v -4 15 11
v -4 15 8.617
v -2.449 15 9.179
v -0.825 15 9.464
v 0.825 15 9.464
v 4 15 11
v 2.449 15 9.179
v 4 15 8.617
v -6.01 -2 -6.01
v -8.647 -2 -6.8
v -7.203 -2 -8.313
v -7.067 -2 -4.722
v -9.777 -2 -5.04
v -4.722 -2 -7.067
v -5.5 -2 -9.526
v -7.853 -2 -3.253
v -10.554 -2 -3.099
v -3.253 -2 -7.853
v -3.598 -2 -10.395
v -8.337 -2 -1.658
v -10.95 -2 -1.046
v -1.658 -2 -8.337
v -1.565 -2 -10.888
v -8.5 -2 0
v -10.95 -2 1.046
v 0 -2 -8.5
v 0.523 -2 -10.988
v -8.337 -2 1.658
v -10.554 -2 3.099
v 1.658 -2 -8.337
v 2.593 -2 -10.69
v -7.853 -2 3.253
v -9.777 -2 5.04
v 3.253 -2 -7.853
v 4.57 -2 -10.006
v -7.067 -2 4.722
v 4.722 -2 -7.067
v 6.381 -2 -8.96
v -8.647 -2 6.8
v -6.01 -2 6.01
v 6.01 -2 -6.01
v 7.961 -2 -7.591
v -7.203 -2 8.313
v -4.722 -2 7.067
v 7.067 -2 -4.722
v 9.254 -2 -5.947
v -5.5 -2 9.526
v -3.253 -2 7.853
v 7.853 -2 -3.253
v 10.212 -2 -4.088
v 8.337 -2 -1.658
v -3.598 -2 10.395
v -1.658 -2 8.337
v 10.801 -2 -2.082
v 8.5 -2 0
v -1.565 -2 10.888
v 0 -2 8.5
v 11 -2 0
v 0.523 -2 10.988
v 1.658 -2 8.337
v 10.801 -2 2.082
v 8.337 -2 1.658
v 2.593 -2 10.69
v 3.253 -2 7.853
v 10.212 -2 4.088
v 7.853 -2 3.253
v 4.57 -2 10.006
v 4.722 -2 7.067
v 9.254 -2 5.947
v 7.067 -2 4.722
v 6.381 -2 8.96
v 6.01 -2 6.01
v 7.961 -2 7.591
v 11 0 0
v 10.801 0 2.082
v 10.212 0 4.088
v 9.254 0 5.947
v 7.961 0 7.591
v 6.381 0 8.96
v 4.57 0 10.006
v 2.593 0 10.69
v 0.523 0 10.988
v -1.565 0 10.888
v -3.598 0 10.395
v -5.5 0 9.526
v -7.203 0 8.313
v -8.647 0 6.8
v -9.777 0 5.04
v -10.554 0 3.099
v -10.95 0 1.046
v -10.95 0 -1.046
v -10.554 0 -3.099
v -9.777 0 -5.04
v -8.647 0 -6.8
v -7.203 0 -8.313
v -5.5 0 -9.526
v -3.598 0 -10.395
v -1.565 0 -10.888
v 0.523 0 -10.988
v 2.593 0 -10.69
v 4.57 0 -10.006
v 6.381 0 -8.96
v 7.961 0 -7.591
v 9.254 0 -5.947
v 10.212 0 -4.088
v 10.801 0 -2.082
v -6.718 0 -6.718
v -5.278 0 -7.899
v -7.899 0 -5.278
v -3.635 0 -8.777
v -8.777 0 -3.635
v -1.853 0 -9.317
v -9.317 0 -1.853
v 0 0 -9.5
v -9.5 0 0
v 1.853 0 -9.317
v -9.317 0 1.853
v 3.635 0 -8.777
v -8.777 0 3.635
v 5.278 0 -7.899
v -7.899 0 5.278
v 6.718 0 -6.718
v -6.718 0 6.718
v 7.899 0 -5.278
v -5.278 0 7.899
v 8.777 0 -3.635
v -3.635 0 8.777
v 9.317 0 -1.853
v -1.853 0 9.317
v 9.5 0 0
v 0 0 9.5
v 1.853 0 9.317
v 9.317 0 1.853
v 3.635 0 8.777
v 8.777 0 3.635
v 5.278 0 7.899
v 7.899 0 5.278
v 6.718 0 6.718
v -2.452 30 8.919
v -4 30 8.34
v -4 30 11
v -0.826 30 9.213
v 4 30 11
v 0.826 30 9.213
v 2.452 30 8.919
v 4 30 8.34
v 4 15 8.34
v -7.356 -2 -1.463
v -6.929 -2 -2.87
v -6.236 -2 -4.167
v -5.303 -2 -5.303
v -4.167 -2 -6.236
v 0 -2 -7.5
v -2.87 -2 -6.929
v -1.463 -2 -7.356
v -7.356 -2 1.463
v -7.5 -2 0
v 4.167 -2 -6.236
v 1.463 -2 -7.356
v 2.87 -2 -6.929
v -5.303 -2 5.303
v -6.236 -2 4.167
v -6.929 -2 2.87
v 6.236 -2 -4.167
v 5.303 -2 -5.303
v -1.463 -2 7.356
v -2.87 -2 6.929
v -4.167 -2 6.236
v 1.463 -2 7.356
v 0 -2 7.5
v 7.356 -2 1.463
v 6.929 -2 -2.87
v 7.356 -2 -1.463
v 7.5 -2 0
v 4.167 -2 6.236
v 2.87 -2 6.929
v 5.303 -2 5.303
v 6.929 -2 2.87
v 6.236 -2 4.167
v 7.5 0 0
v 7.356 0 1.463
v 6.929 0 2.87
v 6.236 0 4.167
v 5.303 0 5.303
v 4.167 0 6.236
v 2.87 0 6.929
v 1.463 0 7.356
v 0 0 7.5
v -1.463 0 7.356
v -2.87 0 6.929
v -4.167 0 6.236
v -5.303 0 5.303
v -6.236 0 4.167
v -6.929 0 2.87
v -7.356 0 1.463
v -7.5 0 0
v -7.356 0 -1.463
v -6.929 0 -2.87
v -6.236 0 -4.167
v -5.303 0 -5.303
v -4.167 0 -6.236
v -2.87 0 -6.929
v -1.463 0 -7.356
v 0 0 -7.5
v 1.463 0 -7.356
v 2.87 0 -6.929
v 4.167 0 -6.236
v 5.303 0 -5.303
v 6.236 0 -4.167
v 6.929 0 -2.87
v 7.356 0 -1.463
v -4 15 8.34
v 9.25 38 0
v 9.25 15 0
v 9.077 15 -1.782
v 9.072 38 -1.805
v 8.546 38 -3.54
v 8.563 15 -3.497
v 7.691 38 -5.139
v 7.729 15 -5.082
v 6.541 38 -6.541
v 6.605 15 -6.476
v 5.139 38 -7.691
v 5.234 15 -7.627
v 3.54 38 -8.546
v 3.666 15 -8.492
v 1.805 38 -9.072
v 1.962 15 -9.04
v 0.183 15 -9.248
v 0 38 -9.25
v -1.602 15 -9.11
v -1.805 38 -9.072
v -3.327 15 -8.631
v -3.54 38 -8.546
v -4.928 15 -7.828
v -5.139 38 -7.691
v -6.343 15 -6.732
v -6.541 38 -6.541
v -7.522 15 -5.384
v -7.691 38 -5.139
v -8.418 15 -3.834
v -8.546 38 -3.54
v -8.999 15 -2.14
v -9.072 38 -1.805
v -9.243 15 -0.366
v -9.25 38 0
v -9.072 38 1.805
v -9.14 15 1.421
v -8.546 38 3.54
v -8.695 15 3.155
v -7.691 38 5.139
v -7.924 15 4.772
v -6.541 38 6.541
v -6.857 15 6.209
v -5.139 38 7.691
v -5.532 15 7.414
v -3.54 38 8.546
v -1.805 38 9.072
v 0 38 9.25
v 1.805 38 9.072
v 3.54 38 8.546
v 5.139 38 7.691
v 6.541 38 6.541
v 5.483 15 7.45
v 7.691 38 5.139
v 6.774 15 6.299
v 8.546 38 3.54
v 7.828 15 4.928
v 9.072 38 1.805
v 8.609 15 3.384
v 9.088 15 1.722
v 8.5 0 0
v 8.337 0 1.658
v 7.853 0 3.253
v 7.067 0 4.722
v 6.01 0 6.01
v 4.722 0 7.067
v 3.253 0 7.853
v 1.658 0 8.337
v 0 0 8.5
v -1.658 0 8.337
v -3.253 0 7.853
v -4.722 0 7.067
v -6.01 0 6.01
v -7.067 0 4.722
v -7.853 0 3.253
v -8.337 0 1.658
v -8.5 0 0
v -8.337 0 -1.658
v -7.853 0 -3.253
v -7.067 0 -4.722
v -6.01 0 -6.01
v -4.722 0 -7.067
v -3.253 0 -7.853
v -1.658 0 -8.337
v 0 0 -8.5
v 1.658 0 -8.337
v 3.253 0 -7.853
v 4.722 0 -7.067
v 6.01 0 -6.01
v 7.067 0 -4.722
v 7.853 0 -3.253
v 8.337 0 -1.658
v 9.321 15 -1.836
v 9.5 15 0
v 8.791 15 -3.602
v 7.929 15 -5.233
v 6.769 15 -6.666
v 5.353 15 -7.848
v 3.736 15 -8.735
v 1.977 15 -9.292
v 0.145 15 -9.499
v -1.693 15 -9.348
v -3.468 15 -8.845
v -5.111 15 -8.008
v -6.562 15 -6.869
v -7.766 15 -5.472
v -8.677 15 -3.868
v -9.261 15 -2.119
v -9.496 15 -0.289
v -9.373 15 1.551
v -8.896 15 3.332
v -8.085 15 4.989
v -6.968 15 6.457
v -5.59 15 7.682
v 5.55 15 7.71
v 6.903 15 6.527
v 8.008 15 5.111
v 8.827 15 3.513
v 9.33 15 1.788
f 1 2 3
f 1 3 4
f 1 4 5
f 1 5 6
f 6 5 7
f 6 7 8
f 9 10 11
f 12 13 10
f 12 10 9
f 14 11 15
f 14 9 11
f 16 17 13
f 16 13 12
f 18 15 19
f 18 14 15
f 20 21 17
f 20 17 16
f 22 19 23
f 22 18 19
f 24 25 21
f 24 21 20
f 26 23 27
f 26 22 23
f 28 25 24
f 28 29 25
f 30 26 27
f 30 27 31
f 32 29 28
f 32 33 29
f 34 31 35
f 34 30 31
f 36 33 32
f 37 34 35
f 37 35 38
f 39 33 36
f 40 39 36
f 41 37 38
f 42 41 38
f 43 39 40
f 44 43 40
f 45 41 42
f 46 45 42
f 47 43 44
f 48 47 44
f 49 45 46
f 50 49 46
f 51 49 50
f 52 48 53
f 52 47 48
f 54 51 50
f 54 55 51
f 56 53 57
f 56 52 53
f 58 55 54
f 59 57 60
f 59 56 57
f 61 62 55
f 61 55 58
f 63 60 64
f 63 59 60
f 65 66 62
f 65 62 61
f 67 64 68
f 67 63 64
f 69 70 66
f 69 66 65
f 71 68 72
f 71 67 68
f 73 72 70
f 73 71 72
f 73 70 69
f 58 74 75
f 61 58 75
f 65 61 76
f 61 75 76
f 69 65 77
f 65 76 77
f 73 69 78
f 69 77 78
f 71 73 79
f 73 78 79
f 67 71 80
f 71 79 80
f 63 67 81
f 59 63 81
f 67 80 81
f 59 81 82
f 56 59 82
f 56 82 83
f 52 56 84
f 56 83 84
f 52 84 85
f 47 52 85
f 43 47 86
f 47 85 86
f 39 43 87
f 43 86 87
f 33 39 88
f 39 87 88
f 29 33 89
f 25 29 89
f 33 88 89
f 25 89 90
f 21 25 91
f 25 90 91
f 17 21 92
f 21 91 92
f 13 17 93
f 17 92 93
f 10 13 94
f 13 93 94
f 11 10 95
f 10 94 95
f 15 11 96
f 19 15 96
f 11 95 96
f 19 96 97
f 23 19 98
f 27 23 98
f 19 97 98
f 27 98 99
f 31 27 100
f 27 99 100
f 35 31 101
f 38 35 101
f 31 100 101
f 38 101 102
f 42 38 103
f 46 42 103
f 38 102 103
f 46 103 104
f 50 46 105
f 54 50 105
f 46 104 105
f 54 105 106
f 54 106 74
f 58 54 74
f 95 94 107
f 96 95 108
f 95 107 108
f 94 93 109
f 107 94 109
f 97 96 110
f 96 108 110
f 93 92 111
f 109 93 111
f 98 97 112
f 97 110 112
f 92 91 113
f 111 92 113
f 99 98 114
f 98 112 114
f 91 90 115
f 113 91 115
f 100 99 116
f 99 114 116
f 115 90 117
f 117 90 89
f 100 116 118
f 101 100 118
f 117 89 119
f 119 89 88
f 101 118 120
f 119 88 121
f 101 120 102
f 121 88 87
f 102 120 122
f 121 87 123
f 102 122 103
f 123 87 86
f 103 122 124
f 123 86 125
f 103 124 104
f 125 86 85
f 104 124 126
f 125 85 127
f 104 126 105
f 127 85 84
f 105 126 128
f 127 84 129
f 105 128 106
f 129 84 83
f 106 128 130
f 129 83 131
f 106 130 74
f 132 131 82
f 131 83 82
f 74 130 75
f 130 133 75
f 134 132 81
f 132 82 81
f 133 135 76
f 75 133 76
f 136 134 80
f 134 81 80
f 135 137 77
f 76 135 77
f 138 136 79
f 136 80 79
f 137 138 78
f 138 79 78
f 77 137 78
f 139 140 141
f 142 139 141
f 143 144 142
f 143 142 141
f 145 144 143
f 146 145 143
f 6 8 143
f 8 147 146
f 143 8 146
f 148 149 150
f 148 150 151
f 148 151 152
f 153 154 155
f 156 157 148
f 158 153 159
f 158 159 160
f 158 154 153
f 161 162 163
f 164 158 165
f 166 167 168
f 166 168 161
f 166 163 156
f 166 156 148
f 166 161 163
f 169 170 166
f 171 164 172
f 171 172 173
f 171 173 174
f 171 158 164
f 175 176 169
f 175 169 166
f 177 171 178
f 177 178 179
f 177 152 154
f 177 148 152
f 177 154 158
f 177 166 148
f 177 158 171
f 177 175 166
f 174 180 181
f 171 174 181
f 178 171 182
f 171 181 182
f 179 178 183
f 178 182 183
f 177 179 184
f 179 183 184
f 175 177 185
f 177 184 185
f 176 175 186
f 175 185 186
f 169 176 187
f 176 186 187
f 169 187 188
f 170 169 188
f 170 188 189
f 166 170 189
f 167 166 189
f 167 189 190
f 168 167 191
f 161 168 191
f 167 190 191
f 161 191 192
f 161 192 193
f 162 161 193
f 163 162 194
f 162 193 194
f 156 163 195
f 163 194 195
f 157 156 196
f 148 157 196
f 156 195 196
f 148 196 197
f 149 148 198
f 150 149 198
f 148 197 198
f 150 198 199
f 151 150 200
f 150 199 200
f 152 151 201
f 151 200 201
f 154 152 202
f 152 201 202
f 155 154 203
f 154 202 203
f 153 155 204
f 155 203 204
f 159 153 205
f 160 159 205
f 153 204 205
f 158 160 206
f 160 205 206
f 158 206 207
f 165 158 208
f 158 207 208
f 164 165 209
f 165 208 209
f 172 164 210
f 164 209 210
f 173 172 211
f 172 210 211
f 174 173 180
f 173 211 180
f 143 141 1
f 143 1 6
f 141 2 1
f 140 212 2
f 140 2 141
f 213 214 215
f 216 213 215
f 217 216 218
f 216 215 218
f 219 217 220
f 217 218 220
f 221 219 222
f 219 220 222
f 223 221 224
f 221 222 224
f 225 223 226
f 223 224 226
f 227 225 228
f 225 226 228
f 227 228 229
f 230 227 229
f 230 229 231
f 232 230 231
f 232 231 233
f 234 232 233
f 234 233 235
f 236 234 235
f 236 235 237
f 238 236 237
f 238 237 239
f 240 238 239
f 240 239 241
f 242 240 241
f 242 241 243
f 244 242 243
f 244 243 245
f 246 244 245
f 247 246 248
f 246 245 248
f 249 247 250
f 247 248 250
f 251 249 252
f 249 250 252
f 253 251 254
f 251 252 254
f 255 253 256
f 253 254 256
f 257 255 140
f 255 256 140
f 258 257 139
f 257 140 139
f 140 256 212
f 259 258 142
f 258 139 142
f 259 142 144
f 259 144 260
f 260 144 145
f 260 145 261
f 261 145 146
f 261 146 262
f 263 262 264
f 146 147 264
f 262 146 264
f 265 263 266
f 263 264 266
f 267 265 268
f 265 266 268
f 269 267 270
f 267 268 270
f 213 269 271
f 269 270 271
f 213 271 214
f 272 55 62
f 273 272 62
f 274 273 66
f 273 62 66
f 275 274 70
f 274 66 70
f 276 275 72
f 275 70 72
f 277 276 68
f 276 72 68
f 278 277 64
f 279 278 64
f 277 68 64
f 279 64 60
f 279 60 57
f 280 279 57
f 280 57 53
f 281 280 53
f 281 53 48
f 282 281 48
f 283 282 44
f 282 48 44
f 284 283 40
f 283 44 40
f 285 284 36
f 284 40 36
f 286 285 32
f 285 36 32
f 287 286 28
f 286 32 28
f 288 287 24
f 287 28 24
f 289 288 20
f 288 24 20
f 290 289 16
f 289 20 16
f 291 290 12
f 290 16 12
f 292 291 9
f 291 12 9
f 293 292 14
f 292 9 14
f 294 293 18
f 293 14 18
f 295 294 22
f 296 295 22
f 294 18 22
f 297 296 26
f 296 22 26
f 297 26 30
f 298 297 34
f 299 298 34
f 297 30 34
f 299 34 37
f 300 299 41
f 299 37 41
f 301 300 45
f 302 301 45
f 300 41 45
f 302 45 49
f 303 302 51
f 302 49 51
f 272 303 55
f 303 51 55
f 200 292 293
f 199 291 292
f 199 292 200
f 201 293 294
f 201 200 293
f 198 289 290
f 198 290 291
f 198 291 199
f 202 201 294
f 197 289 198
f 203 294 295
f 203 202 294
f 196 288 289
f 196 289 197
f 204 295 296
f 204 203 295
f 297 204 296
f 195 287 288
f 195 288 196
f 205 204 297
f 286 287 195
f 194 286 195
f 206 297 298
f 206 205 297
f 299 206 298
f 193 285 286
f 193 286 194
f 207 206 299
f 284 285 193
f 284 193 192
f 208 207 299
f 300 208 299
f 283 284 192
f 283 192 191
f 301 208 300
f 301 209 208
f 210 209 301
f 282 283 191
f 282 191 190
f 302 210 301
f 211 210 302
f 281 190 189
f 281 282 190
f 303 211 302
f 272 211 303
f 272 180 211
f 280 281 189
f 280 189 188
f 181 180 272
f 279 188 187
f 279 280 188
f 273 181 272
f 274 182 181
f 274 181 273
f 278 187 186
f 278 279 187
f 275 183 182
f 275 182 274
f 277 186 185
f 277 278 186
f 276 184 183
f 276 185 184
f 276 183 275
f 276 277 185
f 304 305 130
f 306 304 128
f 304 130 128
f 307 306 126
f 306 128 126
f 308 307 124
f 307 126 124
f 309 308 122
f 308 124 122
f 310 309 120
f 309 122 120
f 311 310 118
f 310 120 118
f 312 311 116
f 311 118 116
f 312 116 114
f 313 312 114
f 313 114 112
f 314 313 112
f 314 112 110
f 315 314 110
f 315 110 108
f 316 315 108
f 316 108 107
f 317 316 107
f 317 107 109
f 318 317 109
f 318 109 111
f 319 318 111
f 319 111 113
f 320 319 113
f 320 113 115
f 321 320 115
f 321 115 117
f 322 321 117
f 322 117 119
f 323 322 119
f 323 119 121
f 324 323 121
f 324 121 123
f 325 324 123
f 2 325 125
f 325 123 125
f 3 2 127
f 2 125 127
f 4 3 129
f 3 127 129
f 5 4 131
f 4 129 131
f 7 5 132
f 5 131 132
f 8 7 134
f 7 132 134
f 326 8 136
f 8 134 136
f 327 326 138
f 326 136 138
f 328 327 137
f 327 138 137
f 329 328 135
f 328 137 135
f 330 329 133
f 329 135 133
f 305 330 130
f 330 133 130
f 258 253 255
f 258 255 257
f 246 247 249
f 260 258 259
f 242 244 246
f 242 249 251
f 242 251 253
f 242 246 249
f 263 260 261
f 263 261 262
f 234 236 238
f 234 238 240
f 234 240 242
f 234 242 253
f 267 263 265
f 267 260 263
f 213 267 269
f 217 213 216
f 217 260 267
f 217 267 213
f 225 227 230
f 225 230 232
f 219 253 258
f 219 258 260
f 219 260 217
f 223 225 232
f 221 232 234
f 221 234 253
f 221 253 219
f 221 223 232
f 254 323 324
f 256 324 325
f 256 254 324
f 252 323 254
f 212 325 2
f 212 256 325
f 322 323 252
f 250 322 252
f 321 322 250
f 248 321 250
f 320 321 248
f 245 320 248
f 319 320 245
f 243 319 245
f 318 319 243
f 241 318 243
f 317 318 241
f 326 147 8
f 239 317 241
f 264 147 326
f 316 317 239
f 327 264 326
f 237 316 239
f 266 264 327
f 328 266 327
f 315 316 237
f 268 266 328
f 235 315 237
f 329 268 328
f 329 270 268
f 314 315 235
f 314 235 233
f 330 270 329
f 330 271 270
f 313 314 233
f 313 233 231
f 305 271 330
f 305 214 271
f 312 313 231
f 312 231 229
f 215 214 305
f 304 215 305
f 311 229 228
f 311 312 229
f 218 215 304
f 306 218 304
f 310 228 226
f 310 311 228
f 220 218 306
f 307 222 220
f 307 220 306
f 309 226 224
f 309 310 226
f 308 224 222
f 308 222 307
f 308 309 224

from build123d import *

# Parameters (mm, degrees)
BOX_W        = 8
BOX_H        = 15
BOX_DEPTH    = 3
SKETCH_R     = 11
PAD_DEPTH    = 2
SKETCH001_R  = 9.5
PAD001_DEPTH = 15
SKETCH002_R  = 9.25
PAD002_DEPTH = 23
SKETCH003_R  = 8.5
POCKET_DEPTH = 2
SKETCH004_R  = 7.5
PAD003_DEPTH = 2


with BuildPart() as cubo:
    # Box → Box (new body)
    with BuildSketch(Plane(origin=(-4, 15, 8), x_dir=(1, 0, 0), z_dir=(0, 0, 1))):
        with Locations((4, 7.5)):
            Rectangle(BOX_W, BOX_H)
    extrude(amount=BOX_DEPTH)


with BuildPart() as fusion:
    # Sketch → Pad (new body)
    with BuildSketch(Plane.XZ):
        Circle(SKETCH_R)
    extrude(amount=PAD_DEPTH)

    # Sketch001 (on Face2 of Pad) → Pad001 (join)
    with BuildSketch(Plane(origin=(0, 0, 0), x_dir=(1, 0, 0), z_dir=(0, 1, 0))):
        Circle(SKETCH001_R)
    extrude(amount=PAD001_DEPTH)

    # Sketch002 (on Face5 of Pad001) → Pad002 (join)
    with BuildSketch(Plane(origin=(0, 15, 0), x_dir=(1, 0, 0), z_dir=(0, 1, 0))):
        Circle(SKETCH002_R)
    extrude(amount=PAD002_DEPTH)

    # Sketch003 (on Face3 of Pad002) → Pocket (cut)
    with BuildSketch(Plane.XZ.offset(2)):
        Circle(SKETCH003_R)
    extrude(amount=-POCKET_DEPTH, mode=Mode.SUBTRACT)

    # Sketch004 (on Face7 of Pocket) → Pad003 (join)
    with BuildSketch(Plane.XZ):
        Circle(SKETCH004_R)
    extrude(amount=PAD003_DEPTH)

    # Fusion: union Cubo
    add(cubo.part)


solid = fusion.part
